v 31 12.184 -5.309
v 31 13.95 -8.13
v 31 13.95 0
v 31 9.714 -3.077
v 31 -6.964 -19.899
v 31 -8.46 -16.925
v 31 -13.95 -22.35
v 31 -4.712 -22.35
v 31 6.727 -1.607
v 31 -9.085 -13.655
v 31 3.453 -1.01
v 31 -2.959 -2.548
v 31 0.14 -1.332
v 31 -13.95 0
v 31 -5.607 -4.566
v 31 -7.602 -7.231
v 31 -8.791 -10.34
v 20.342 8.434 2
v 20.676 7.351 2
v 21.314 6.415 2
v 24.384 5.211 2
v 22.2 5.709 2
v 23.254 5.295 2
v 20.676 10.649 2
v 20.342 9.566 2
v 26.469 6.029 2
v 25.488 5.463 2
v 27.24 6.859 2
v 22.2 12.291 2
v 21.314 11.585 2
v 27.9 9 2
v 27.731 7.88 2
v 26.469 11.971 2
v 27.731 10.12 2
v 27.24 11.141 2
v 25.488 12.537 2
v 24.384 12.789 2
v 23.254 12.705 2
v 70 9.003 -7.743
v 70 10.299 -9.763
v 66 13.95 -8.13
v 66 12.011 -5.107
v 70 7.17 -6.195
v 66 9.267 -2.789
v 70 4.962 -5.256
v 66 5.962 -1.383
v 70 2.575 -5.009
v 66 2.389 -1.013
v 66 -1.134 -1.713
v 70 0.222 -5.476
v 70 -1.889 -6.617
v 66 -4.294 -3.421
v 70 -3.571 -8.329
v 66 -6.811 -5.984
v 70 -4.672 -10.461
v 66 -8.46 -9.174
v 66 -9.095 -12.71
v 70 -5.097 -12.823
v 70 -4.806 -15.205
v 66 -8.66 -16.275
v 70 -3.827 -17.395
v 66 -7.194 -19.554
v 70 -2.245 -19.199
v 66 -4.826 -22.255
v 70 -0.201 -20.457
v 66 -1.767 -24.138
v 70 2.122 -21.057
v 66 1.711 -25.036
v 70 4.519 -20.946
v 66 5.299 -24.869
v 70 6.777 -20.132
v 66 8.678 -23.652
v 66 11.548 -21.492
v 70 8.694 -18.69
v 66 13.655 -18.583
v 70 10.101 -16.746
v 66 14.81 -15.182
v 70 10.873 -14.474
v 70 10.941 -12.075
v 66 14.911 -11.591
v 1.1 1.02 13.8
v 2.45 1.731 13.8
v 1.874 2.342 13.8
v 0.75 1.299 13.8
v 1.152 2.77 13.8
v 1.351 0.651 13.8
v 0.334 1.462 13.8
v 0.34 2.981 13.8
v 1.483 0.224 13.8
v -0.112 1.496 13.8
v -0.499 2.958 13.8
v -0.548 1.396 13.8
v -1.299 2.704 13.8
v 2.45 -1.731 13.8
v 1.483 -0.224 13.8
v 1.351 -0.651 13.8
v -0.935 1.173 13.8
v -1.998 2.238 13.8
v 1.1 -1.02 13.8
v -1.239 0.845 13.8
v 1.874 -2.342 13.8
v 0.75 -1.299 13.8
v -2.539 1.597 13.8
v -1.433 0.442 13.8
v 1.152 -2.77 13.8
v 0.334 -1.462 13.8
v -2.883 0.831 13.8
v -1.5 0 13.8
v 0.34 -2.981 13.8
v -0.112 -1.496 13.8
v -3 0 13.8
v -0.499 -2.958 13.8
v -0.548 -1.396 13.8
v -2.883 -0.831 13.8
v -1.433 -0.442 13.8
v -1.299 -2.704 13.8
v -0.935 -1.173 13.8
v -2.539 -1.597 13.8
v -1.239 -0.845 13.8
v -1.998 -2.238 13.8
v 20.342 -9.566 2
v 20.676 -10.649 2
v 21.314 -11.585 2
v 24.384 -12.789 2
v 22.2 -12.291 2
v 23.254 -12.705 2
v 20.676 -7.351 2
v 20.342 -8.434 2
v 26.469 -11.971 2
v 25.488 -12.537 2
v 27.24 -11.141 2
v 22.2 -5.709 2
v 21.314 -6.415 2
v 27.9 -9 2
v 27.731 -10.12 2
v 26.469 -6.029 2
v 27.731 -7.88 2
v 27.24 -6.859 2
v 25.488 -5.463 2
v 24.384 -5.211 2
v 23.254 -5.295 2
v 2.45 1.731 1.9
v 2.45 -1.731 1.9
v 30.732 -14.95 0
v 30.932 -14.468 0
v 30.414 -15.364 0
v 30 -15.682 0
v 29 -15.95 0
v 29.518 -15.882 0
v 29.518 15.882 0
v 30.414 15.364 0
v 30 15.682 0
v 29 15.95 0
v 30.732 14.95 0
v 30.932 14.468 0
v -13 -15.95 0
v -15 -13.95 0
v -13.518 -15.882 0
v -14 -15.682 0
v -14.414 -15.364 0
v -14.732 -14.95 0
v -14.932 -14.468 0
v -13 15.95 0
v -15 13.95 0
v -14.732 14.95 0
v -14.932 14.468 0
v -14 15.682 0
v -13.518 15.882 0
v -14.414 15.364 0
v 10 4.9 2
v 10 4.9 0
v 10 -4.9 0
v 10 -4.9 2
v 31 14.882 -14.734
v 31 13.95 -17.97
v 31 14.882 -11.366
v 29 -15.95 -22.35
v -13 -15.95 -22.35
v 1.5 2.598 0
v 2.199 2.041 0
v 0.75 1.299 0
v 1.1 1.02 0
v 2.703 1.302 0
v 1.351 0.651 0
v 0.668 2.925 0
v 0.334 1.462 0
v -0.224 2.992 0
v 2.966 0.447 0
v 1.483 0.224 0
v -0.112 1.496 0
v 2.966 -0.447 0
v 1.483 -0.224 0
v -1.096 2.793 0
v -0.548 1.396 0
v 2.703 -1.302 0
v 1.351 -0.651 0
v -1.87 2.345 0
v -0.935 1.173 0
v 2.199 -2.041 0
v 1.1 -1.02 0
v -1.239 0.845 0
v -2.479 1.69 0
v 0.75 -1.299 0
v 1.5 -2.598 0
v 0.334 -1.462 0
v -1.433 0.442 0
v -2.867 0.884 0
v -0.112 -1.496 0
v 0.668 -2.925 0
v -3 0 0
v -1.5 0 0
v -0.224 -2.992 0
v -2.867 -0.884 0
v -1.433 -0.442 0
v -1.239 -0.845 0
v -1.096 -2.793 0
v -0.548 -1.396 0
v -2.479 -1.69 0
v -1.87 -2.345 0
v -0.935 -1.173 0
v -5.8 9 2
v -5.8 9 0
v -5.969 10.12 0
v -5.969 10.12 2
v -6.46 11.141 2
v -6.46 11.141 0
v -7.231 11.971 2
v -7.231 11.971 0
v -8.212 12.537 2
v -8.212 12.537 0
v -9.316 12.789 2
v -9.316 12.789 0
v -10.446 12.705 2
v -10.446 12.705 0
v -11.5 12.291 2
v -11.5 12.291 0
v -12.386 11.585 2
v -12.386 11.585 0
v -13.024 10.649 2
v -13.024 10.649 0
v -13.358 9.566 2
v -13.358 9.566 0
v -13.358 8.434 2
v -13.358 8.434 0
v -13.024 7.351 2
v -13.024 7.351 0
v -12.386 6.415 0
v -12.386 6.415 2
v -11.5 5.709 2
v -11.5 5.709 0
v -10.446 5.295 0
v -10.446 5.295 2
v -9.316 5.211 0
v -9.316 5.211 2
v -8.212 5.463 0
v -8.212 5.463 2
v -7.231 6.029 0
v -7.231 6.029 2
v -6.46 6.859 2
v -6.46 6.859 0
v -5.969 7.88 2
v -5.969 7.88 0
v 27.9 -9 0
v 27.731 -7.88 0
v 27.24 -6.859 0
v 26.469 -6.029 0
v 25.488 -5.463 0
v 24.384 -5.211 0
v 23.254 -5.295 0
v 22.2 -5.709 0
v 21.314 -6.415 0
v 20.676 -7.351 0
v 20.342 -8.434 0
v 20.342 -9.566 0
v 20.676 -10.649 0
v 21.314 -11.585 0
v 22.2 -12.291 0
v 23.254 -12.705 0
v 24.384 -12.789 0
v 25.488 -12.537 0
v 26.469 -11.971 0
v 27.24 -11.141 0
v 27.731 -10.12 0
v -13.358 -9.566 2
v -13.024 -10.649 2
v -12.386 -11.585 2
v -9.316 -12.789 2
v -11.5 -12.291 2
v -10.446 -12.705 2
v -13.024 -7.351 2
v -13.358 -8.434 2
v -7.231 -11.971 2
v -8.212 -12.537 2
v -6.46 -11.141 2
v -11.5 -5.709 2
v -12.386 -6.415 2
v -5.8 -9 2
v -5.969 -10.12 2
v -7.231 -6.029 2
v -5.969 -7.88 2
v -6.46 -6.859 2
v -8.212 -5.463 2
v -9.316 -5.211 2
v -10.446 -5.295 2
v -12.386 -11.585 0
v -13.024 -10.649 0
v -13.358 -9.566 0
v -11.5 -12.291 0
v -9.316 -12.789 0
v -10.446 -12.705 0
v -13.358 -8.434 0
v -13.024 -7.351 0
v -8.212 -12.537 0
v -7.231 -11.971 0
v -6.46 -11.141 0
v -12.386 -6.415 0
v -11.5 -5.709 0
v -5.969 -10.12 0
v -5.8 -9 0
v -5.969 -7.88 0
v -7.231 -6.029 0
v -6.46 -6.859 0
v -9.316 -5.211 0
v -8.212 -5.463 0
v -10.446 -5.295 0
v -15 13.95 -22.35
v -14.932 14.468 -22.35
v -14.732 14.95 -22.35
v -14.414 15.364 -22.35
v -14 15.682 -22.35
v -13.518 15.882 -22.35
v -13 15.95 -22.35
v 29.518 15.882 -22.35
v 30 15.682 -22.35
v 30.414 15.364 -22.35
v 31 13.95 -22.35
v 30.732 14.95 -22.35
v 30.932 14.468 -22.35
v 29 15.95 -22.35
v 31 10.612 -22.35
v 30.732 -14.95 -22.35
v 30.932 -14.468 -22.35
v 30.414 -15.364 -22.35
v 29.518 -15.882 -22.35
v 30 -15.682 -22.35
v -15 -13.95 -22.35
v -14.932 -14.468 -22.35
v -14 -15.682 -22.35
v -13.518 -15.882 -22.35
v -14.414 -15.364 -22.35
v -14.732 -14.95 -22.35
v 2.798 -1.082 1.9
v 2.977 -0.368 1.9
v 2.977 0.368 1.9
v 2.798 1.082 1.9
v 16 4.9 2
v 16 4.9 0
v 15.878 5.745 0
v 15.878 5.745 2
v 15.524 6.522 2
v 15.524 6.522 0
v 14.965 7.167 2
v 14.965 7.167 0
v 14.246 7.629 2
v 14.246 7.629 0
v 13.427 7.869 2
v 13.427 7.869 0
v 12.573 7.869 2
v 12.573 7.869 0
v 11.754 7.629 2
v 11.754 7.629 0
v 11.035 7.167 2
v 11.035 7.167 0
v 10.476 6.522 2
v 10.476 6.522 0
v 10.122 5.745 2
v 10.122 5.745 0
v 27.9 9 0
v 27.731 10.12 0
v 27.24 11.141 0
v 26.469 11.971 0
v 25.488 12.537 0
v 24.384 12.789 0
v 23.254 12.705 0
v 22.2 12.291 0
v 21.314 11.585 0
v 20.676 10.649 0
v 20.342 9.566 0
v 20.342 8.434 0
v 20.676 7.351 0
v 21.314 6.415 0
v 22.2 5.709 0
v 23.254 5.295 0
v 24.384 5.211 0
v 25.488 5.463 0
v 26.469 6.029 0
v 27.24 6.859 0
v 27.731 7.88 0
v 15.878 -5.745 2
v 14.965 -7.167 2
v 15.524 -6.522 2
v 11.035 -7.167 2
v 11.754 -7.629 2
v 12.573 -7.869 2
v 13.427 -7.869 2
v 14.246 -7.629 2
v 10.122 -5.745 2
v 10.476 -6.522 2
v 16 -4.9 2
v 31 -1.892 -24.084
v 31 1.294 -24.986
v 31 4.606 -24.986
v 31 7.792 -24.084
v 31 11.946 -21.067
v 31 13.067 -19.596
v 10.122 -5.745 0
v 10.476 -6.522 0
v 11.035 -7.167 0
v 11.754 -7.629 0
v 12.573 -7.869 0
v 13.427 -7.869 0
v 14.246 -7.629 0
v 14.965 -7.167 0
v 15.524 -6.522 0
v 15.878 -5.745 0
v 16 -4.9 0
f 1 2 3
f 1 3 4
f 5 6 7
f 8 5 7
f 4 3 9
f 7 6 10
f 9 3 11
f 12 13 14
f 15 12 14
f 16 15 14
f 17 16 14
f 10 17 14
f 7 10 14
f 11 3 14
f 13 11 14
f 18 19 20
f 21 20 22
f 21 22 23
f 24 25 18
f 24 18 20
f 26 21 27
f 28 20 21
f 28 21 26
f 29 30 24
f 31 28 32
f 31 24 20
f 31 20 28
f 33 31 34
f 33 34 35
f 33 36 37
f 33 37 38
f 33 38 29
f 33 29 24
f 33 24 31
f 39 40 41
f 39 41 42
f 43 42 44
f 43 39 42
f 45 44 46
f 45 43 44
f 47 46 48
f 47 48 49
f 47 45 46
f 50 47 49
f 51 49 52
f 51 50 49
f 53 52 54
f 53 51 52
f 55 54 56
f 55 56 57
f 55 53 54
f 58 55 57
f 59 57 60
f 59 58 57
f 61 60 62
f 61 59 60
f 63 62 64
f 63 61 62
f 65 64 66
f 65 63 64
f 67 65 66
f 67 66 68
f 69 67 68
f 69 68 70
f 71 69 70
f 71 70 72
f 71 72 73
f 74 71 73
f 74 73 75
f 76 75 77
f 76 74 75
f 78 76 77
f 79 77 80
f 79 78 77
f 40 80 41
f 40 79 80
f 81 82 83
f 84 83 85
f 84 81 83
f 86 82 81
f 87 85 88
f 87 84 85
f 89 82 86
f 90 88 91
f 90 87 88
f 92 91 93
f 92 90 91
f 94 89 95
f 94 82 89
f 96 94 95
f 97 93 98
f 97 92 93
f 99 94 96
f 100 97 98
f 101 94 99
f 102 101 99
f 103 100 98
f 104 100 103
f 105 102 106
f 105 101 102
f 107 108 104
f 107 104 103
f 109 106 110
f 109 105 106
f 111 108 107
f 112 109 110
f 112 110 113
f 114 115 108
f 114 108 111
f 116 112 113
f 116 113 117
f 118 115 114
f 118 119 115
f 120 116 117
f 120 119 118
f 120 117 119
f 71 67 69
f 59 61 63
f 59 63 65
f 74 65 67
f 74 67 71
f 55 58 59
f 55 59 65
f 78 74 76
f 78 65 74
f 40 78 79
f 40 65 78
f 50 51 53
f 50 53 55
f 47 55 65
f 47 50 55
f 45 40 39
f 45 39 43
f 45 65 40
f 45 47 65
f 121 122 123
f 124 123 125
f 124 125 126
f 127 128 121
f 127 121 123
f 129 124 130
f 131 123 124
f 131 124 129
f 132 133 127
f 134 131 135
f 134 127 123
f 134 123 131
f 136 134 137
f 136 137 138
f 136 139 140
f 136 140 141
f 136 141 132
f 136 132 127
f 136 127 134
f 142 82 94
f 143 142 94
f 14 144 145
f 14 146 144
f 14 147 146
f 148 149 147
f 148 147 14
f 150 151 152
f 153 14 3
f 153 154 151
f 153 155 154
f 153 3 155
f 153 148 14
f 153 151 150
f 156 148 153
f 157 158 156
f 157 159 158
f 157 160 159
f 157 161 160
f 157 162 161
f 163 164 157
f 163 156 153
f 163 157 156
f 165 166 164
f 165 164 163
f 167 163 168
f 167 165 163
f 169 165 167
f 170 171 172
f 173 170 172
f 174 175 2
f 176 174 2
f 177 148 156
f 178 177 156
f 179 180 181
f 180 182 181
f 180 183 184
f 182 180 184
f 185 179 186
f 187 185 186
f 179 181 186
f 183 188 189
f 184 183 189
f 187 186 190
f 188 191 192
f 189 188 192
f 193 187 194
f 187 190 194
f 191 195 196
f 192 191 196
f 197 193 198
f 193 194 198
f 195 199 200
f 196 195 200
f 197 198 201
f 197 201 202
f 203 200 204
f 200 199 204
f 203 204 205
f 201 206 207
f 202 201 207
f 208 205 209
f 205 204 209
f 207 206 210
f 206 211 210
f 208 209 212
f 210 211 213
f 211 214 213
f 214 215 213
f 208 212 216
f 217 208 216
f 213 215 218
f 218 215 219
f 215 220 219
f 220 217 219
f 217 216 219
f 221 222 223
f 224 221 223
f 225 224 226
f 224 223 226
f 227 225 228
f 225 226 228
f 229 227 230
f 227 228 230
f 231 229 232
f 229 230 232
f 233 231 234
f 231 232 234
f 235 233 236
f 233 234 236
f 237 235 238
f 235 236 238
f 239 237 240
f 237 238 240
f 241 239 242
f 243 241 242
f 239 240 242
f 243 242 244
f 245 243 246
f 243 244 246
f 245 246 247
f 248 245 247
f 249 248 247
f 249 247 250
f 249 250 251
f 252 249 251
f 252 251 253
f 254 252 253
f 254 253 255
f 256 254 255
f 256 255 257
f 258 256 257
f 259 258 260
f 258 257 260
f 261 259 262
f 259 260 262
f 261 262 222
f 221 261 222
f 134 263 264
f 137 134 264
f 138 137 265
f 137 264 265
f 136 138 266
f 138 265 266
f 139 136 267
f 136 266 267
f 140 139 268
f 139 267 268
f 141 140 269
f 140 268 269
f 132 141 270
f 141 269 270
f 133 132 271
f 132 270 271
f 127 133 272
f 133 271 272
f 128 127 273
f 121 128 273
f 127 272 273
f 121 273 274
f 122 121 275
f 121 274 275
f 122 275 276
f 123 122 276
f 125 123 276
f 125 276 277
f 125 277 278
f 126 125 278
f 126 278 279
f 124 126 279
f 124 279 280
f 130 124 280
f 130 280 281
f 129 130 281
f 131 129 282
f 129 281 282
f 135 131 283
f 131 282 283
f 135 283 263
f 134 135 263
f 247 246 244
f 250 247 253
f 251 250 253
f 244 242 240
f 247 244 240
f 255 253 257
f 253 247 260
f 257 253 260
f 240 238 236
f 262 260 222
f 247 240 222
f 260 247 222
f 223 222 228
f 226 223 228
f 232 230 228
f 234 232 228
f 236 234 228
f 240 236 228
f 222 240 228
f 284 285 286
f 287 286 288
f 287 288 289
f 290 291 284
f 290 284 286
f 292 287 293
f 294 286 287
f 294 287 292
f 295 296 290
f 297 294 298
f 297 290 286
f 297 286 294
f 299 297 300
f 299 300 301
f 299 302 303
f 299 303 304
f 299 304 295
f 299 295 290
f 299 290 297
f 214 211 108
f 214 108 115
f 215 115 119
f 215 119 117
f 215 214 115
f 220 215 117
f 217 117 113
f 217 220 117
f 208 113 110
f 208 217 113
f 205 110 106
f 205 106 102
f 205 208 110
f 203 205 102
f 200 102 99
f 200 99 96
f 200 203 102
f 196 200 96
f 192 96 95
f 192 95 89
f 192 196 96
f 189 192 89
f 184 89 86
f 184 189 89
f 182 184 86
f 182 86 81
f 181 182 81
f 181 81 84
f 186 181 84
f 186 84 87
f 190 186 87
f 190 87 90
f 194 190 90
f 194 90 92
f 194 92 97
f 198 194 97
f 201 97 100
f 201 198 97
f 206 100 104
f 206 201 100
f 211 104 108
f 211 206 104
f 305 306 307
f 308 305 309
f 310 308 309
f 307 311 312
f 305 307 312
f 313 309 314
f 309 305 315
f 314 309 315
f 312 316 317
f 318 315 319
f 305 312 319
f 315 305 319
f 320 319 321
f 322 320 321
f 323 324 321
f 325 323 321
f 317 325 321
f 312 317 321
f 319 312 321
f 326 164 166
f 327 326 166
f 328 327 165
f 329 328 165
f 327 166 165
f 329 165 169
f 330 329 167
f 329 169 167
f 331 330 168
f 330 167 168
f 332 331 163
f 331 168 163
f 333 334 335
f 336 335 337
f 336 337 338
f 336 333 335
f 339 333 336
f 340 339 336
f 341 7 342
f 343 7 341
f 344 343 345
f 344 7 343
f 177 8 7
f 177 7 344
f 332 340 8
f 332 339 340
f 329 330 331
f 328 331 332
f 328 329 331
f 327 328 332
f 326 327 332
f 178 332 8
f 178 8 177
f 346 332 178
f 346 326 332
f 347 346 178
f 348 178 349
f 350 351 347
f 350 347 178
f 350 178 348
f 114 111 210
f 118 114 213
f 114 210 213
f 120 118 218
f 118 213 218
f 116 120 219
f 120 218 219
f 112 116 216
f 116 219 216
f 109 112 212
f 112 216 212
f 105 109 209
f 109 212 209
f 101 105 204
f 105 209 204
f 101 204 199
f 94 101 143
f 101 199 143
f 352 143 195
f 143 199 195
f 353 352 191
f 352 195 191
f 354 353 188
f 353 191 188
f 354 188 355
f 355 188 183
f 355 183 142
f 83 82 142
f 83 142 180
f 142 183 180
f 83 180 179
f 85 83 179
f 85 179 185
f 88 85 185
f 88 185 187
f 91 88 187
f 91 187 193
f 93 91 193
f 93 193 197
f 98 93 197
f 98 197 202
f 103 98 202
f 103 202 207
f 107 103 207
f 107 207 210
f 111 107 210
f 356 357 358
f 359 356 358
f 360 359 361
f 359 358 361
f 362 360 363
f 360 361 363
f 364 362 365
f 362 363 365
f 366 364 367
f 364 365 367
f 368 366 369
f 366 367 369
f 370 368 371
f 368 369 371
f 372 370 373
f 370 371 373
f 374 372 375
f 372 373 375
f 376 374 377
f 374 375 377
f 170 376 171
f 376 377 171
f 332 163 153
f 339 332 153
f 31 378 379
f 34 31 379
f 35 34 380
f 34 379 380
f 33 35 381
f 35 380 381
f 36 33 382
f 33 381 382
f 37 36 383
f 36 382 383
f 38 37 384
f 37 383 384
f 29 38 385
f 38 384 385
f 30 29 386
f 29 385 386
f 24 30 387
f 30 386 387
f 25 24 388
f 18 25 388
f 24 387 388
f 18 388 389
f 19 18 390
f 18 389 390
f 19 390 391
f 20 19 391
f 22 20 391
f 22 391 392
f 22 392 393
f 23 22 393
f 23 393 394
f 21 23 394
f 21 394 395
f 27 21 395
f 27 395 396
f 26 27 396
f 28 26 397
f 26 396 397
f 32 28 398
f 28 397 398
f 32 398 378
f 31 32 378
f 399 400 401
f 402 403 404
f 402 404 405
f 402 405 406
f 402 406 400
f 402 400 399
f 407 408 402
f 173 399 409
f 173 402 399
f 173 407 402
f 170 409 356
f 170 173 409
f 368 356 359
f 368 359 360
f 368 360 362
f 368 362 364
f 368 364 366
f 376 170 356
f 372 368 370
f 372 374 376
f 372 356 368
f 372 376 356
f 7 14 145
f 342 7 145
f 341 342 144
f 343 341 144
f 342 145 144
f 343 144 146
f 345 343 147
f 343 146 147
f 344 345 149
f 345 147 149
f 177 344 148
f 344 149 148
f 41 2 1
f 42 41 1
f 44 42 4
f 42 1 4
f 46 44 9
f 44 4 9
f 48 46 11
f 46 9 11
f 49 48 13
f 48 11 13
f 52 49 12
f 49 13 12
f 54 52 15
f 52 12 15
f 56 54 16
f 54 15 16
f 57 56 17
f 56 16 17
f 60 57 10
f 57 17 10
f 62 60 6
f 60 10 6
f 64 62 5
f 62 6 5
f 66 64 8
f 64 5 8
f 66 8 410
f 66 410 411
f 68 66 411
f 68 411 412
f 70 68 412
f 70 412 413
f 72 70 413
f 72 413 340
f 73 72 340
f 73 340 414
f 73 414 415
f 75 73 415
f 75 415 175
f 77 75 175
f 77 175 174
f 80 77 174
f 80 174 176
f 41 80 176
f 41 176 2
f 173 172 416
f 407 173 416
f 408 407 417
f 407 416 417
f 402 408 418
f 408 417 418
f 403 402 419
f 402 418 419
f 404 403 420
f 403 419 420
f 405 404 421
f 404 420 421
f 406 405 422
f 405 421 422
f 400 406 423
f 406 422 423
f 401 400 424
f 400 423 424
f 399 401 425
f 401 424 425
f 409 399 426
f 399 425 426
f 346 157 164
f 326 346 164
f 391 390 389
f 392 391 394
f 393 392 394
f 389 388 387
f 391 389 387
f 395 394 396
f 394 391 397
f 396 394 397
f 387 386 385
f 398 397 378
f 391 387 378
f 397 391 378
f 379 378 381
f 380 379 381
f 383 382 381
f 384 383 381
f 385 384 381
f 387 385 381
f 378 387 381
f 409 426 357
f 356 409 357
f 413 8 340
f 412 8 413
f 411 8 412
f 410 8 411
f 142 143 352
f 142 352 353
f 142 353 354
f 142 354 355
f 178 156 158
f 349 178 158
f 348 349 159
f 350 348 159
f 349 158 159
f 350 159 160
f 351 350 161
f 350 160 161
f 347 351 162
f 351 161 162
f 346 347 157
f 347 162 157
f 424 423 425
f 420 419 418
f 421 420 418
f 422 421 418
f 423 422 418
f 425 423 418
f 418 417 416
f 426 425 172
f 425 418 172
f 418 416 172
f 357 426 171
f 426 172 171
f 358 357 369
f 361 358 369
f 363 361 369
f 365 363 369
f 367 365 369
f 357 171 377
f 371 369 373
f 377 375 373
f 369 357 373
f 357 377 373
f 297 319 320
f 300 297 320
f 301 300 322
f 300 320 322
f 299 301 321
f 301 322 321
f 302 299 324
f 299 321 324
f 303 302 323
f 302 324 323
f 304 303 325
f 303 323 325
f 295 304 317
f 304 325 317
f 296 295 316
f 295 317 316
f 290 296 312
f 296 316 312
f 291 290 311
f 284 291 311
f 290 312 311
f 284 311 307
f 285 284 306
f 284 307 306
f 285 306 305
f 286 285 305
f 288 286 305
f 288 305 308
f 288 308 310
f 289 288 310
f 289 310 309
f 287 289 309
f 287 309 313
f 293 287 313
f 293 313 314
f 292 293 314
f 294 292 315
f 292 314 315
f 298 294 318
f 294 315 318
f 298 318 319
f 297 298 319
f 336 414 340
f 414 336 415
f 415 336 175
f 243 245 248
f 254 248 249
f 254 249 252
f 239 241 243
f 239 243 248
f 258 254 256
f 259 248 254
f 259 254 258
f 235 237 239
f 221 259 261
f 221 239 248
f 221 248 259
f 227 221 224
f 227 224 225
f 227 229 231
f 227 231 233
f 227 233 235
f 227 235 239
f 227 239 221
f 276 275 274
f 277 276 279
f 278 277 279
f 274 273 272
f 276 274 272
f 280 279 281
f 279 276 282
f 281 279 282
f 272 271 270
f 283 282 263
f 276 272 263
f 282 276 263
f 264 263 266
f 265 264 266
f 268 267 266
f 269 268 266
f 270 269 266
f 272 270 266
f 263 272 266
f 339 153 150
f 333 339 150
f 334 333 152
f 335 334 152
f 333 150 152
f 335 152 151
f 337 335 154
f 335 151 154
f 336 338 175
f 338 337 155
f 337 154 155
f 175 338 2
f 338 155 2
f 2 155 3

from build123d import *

# Parameters (mm, degrees)
SKETCH1_R             = 3
SKETCH1_R_2           = 1.5
BOSS_EXTRUDE1_DEPTH   = 13.8
CUT_EXTRUDE1_REACH    = 18.337
CUT_EXTRUDE1_START    = 1.9
BOSS_EXTRUDE2_DEPTH   = 2
SKETCH1_5_R           = 3.8
BOSS_EXTRUDE2_2_DEPTH = 2
BOSS_EXTRUDE2_3_DEPTH = 2
BOSS_EXTRUDE2_4_DEPTH = 2
BOSS_EXTRUDE2_5_DEPTH = 2
BOSS_EXTRUDE3_DEPTH   = 22.35
SKETCH2_R             = 12.05
BOSS_EXTRUDE4_DEPTH   = 39
CHAMFER1_SIZE         = 4


with BuildPart() as part:
    # Sketch1 → Boss-Extrude1 (new body)
    with BuildSketch(Plane(origin=(0, 0, 0), x_dir=(0, 1, 0), z_dir=(0, 0, 1))):
        Circle(SKETCH1_R)
        Circle(SKETCH1_R_2, mode=Mode.SUBTRACT)
    extrude(amount=BOSS_EXTRUDE1_DEPTH)

    # Sketch1<4> → Cut-Extrude1 (cut, up to next)
    with BuildSketch(Plane(origin=(0, 0, 0), x_dir=(0, 1, 0), z_dir=(0, 0, 1)).offset(CUT_EXTRUDE1_START), mode=Mode.PRIVATE) as cut_extrude1_sk1:
        with BuildLine():
            Line((1.731328969, -2.45), (-1.731328969, -2.45))
            ThreePointArc((-1.731328969, -2.45), (0, -3), (1.731328969, -2.45))
        make_face()
    cut_extrude1_tool1 = extrude(cut_extrude1_sk1.sketch, amount=CUT_EXTRUDE1_REACH, mode=Mode.PRIVATE) & part.part
    add(cut_extrude1_tool1.solids().sort_by_distance((2.671826, 0, 1.9))[0], mode=Mode.SUBTRACT)


with BuildPart() as body_2:
    # Sketch1<5> → Boss-Extrude2 (new body)
    with BuildSketch(Plane(origin=(0, 0, 0), x_dir=(0, 1, 0), z_dir=(0, 0, 1))):
        with BuildLine():
            Line((4.9, -10), (-4.9, -10))
            ThreePointArc((-4.9, -10), (-7.9, -13), (-4.9, -16))
            Line((-4.9, -16), (4.9, -16))
            ThreePointArc((4.9, -16), (7.9, -13), (4.9, -10))
        make_face()
    extrude(amount=BOSS_EXTRUDE2_DEPTH)


with BuildPart() as body_3:
    # Sketch1<5> → Boss-Extrude2 2 (new body)
    with BuildSketch(Plane(origin=(0, 0, 0), x_dir=(0, 1, 0), z_dir=(0, 0, 1))):
        with Locations((-9, 9.6)):
            Circle(SKETCH1_5_R)
    extrude(amount=BOSS_EXTRUDE2_2_DEPTH)


with BuildPart() as body_4:
    # Sketch1<5> → Boss-Extrude2 3 (new body)
    with BuildSketch(Plane(origin=(0, 0, 0), x_dir=(0, 1, 0), z_dir=(0, 0, 1))):
        with Locations((9, 9.6)):
            Circle(SKETCH1_5_R)
    extrude(amount=BOSS_EXTRUDE2_3_DEPTH)


with BuildPart() as body_5:
    # Sketch1<5> → Boss-Extrude2 4 (new body)
    with BuildSketch(Plane(origin=(0, 0, 0), x_dir=(0, 1, 0), z_dir=(0, 0, 1))):
        with Locations((-9, -24.1)):
            Circle(SKETCH1_5_R)
    extrude(amount=BOSS_EXTRUDE2_4_DEPTH)


with BuildPart() as body_6:
    # Sketch1<5> → Boss-Extrude2 5 (new body)
    with BuildSketch(Plane(origin=(0, 0, 0), x_dir=(0, 1, 0), z_dir=(0, 0, 1))):
        with Locations((9, -24.1)):
            Circle(SKETCH1_5_R)
    extrude(amount=BOSS_EXTRUDE2_5_DEPTH)


with BuildPart() as body_7:
    # Sketch1<6> → Boss-Extrude3 (new body)
    with BuildSketch(Plane(origin=(0, 0, 0), x_dir=(0, 1, 0), z_dir=(0, 0, 1))):
        with BuildLine():
            Line((13.95, 15), (-13.95, 15))
            ThreePointArc((-13.95, 15), (-15.364213562, 14.414213562), (-15.95, 13))
            Line((-15.95, 13), (-15.95, -29))
            ThreePointArc((-15.95, -29), (-15.364213562, -30.414213562), (-13.95, -31))
            Line((-13.95, -31), (13.95, -31))
            ThreePointArc((13.95, -31), (15.364213562, -30.414213562), (15.95, -29))
            Line((15.95, -29), (15.95, 13))
            ThreePointArc((15.95, 13), (15.364213562, 14.414213562), (13.95, 15))
        make_face()
    extrude(amount=-BOSS_EXTRUDE3_DEPTH)

    # Sketch2 → Boss-Extrude4 (add)
    with BuildSketch(Plane.YZ.offset(31)):
        with Locations((2.95, -13.05)):
            Circle(SKETCH2_R)
    extrude(amount=BOSS_EXTRUDE4_DEPTH)

    # Chamfer1
    chamfer1_edges = [body_7.edges().sort_by_distance(p)[0] for p in [
        (70, -9.1, -13.05),
    ]]
    chamfer(chamfer1_edges, length=CHAMFER1_SIZE)


solid = Compound([part.part, body_2.part, body_3.part, body_4.part, body_5.part, body_6.part, body_7.part])
